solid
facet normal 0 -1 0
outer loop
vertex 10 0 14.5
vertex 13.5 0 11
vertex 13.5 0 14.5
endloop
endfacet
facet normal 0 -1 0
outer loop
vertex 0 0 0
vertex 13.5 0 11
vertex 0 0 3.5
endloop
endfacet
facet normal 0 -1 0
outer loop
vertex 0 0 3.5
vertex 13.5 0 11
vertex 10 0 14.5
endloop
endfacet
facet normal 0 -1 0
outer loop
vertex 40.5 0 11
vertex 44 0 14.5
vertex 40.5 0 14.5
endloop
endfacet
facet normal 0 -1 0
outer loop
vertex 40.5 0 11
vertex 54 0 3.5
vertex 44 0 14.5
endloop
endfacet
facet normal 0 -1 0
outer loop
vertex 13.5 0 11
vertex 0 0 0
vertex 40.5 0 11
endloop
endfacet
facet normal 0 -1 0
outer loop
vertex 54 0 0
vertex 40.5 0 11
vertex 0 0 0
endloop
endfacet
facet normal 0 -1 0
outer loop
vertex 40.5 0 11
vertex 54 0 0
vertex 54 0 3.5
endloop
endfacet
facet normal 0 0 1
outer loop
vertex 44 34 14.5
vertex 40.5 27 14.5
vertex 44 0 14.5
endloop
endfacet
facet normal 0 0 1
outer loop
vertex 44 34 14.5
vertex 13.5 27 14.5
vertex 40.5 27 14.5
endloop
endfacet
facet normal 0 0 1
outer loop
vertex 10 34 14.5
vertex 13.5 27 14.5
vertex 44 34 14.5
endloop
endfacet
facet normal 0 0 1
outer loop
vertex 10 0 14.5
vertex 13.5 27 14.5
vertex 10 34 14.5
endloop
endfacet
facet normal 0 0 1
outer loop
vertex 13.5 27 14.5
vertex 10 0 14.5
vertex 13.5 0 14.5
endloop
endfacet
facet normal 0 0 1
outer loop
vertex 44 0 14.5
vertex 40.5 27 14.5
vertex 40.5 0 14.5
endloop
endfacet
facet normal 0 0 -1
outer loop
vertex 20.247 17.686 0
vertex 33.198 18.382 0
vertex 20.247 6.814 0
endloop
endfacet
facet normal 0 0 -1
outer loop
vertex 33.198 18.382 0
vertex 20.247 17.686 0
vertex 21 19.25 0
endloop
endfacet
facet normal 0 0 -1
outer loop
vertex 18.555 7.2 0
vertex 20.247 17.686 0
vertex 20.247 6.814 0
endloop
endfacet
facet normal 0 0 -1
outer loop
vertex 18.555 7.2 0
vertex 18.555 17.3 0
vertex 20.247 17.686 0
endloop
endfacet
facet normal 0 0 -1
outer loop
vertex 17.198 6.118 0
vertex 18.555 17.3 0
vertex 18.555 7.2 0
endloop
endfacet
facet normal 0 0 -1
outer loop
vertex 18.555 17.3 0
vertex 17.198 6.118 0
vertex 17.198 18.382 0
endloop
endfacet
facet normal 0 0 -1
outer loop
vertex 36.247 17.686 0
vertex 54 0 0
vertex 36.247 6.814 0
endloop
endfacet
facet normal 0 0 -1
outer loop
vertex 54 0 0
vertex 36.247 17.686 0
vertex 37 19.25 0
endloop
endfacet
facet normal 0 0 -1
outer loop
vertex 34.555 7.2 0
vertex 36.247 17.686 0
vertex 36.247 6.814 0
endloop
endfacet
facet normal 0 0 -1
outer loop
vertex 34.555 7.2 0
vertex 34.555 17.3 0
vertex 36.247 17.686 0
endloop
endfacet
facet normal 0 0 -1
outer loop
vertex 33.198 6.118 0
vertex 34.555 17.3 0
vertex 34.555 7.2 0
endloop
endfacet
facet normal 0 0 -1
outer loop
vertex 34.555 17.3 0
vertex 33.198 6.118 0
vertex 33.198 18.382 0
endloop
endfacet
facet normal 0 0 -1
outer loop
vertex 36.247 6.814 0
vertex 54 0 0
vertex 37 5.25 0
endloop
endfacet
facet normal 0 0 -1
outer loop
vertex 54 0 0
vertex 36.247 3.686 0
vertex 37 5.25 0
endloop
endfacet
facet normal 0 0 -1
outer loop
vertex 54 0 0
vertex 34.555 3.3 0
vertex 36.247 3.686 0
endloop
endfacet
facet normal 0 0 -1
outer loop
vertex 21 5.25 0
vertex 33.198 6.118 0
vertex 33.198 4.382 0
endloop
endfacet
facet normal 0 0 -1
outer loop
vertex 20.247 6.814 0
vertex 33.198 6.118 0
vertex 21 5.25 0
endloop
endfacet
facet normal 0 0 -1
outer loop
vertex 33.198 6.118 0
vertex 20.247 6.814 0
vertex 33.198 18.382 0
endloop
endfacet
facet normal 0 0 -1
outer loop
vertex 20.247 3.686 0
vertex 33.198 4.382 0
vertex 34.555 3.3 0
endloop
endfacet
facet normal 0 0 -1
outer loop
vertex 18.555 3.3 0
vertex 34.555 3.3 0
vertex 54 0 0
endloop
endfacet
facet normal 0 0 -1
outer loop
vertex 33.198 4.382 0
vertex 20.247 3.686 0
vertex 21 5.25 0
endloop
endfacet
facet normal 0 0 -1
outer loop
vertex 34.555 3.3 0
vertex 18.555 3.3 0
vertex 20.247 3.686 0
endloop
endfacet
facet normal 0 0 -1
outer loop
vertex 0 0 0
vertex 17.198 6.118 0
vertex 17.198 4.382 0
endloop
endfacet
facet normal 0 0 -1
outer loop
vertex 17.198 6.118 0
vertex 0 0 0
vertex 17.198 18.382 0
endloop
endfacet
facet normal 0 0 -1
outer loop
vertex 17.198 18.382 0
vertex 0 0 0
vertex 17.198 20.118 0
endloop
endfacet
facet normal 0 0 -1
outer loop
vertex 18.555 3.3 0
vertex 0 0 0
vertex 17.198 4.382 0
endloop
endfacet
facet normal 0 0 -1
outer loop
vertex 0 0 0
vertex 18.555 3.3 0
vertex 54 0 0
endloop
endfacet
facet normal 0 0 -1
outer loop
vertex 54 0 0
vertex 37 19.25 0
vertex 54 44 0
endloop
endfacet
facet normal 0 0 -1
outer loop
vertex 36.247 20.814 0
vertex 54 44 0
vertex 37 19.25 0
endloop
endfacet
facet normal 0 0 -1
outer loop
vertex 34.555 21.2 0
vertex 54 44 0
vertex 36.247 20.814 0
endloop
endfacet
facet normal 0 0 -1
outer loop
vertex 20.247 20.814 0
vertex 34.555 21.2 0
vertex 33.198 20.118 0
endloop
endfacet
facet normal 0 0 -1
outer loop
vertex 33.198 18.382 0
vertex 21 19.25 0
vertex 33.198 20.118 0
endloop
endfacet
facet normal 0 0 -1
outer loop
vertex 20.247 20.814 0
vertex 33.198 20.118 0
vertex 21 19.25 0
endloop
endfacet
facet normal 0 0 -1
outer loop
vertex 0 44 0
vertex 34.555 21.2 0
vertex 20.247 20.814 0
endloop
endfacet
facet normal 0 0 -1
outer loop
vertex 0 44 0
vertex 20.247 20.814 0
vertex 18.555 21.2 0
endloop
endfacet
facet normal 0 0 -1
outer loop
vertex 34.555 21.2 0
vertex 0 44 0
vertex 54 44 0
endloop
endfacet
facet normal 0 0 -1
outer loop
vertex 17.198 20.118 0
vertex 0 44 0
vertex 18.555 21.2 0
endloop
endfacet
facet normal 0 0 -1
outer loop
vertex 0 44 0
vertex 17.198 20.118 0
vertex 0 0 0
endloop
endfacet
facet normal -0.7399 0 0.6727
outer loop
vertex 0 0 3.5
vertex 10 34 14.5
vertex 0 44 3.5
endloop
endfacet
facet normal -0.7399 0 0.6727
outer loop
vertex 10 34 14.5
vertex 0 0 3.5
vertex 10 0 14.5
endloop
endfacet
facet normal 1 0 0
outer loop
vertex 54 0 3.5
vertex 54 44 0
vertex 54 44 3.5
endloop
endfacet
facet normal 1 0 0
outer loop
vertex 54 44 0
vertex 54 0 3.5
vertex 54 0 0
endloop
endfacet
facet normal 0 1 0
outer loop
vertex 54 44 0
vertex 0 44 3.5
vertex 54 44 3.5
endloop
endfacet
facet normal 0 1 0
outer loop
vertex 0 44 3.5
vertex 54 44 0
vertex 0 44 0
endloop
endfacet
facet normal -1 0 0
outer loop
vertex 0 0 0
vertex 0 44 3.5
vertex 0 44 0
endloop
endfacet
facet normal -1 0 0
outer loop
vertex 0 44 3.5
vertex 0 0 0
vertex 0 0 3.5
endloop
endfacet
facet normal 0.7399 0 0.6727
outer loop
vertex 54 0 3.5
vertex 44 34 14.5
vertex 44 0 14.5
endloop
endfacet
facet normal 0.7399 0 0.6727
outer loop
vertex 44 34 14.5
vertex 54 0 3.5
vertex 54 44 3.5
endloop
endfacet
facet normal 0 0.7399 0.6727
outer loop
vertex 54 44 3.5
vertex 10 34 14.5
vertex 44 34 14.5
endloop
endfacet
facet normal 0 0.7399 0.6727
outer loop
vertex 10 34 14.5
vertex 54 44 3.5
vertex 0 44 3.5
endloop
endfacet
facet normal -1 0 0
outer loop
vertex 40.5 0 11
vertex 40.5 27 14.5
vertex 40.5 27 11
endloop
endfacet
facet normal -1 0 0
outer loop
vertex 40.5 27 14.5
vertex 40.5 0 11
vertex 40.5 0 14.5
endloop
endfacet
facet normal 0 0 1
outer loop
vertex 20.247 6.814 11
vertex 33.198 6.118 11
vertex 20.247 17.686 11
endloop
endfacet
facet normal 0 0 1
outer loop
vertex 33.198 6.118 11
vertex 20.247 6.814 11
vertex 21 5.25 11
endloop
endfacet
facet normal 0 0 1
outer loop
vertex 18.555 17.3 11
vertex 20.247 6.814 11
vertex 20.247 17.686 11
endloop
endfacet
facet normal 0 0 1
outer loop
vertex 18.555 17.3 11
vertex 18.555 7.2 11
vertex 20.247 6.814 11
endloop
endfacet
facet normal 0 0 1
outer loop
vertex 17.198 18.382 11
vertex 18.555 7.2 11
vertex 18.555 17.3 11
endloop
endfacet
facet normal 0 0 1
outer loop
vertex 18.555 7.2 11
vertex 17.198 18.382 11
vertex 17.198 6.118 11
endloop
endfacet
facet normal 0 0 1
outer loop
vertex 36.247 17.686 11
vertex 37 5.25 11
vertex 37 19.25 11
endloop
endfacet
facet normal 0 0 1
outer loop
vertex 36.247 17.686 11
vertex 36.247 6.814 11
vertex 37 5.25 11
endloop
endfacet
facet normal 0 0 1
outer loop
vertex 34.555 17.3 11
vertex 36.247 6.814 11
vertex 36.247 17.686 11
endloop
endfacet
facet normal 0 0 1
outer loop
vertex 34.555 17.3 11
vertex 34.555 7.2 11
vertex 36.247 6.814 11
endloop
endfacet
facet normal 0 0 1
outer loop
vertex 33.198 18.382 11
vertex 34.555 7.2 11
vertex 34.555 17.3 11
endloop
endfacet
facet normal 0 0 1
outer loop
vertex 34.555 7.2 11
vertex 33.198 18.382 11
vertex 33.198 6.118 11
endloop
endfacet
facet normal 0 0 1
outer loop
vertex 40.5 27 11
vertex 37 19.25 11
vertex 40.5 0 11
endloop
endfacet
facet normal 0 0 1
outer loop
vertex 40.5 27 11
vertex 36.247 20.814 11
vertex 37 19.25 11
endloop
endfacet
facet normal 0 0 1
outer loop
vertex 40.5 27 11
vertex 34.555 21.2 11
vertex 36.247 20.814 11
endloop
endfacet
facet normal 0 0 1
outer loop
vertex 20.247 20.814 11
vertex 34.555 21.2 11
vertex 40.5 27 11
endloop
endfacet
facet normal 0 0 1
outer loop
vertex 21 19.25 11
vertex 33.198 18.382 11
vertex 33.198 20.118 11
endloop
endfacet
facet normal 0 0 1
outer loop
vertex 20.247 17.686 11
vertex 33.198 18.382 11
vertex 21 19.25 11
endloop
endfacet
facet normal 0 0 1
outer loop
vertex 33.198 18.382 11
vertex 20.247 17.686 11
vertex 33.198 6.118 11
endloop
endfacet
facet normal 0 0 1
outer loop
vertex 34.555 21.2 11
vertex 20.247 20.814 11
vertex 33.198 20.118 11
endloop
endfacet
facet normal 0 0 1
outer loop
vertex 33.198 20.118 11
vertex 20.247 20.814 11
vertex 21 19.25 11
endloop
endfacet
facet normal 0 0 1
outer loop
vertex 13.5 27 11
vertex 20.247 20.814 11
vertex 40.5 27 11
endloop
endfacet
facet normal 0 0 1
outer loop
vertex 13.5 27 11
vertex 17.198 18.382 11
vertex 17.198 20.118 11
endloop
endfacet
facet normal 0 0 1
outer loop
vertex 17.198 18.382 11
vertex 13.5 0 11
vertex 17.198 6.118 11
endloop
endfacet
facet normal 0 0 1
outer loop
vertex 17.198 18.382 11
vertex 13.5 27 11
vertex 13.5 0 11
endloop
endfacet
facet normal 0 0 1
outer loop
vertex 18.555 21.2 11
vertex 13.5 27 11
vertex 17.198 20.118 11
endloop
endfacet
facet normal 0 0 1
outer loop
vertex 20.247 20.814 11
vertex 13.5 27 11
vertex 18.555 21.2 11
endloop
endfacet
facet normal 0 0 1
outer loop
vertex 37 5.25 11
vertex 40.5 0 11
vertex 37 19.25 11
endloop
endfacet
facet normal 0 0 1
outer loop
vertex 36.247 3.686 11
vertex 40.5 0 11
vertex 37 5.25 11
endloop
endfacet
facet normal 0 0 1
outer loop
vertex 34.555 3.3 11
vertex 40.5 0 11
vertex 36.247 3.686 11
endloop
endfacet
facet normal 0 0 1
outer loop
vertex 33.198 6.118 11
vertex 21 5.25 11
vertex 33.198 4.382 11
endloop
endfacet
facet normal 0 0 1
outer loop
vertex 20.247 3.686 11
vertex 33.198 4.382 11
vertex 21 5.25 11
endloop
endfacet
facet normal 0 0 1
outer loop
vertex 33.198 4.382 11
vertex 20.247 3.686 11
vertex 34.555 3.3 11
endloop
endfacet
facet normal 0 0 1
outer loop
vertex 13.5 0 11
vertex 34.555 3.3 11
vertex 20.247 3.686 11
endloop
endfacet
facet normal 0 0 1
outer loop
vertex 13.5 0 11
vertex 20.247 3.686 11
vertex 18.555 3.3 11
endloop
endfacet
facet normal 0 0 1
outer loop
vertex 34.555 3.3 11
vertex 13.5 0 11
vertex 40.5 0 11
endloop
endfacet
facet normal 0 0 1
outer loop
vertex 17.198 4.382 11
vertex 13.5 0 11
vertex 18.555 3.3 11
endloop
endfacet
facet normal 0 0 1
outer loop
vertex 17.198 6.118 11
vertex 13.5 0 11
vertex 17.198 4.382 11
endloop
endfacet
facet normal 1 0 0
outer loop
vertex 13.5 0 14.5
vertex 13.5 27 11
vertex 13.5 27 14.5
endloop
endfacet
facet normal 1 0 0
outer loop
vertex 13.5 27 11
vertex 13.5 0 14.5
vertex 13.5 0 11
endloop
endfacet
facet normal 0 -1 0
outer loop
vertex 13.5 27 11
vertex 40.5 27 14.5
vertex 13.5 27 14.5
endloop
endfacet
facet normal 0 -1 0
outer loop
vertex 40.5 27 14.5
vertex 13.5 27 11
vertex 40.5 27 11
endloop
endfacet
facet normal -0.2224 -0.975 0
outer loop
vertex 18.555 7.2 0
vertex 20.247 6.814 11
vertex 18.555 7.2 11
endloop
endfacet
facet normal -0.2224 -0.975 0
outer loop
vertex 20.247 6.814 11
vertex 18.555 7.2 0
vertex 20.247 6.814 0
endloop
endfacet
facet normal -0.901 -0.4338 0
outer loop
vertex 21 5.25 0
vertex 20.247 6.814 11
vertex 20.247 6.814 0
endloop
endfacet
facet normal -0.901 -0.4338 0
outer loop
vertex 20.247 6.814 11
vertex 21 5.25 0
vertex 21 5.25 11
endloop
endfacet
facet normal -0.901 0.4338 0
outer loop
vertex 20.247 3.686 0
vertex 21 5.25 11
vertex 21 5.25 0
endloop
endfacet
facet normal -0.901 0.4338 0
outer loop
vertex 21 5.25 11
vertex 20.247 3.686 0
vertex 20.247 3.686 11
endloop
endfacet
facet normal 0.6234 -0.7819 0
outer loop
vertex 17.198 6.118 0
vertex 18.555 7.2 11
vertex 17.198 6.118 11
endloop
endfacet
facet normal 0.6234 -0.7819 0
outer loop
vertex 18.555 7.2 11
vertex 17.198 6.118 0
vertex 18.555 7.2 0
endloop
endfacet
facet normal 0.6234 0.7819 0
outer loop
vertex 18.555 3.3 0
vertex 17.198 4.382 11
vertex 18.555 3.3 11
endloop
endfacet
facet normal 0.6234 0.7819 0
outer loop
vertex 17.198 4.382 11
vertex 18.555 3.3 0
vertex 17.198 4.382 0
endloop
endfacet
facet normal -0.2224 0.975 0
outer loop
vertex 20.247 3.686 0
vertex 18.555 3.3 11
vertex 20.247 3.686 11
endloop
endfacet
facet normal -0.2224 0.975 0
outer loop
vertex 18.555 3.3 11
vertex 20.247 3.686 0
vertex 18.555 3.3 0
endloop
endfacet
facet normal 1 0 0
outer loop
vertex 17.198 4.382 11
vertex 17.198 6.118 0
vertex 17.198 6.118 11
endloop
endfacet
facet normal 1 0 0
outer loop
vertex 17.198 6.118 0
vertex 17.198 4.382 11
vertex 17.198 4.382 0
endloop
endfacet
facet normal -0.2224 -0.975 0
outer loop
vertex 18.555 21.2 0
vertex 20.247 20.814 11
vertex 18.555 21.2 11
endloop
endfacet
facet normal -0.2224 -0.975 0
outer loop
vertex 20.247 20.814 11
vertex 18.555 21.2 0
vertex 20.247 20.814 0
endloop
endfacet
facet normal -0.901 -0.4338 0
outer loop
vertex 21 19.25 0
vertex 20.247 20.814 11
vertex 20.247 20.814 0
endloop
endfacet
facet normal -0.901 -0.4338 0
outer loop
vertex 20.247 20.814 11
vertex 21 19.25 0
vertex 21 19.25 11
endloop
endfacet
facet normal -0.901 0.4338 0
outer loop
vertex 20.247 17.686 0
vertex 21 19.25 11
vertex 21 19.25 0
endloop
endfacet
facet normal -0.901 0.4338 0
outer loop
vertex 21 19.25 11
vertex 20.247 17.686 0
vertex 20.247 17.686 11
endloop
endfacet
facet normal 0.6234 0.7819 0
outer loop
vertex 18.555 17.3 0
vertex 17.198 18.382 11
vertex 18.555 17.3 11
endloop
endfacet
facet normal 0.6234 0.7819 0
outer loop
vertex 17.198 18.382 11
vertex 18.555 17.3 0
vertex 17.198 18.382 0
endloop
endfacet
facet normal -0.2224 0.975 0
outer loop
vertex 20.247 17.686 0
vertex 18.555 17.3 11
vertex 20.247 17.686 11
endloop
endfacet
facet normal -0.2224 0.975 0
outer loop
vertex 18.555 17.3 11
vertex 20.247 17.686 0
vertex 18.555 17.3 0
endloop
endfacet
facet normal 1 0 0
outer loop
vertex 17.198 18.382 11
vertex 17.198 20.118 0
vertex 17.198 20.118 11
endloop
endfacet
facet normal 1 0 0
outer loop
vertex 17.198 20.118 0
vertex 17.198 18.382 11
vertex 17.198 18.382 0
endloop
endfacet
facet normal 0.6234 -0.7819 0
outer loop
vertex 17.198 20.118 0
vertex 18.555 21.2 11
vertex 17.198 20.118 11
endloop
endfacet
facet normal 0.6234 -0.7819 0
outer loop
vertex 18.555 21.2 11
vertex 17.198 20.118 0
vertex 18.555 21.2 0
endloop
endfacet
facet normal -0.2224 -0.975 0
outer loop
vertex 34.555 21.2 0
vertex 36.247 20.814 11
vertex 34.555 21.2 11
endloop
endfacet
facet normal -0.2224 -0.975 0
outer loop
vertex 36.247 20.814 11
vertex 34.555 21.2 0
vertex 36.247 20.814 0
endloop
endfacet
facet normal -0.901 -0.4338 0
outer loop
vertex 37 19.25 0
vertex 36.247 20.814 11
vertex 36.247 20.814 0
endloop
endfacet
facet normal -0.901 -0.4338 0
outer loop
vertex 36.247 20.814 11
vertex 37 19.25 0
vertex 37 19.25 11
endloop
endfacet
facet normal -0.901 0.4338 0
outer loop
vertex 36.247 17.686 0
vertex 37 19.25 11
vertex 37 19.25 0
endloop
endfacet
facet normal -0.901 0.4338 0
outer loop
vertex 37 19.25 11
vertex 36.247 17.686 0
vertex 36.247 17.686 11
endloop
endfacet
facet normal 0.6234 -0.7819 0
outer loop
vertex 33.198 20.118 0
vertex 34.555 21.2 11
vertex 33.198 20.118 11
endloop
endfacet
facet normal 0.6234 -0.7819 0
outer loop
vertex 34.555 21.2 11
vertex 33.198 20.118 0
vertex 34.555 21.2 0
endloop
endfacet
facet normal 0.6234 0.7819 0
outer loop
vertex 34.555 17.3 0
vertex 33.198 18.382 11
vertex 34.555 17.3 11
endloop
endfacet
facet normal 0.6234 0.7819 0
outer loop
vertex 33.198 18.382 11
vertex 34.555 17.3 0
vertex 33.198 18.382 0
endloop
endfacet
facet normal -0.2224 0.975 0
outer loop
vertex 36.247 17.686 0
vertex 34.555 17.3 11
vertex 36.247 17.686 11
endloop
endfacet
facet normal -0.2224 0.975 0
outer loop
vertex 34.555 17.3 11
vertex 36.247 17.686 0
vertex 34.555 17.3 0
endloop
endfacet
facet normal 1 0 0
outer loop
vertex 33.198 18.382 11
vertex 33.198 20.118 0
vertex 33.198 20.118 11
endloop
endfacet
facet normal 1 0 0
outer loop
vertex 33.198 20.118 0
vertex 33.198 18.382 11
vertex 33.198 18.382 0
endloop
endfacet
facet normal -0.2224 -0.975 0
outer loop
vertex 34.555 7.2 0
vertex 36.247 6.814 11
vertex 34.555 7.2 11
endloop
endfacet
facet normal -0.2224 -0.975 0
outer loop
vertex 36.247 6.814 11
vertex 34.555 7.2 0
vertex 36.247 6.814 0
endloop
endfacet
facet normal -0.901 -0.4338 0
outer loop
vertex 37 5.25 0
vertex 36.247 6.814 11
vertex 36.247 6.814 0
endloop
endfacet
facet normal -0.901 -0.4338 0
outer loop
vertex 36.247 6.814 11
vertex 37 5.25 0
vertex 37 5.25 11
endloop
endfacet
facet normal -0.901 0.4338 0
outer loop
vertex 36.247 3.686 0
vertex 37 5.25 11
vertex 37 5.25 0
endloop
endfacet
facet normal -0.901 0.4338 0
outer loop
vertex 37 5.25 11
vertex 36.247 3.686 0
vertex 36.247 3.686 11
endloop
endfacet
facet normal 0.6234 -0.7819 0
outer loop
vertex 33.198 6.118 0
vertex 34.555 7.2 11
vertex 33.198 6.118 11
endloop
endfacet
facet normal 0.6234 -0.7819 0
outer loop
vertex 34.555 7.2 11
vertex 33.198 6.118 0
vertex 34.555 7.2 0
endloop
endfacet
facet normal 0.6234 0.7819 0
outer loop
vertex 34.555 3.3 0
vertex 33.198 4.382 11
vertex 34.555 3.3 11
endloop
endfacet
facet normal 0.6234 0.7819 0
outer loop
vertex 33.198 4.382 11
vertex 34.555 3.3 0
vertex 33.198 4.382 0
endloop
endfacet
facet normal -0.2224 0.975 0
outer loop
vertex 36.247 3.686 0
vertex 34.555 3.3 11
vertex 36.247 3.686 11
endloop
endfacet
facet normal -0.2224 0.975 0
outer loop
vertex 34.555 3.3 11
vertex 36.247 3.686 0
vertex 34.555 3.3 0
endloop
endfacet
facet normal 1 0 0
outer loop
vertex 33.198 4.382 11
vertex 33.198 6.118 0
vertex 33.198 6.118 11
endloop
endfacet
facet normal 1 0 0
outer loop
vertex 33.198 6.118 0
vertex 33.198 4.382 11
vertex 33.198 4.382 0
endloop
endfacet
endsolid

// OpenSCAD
height = 11;
wall=3.5;
bkt_w = 27;
bkt_l = 27;
bkt_h = 3.5;
hole_d = 4;

skirt = 10;

hole_center = (2*wall + bkt_w) / 2;
h_x1 = skirt + hole_center - 8;
h_x2 = skirt + hole_center + 8;
h_y1 = 5.25;
h_y2 = h_y1 + 14;

top_w = bkt_w + (2 * wall);
top_l = bkt_l + (2 * wall);
top_offset = skirt;
bottom_w = top_w + (2 * skirt);
bottom_l = top_l + skirt;

difference() {
    hull() {
        translate([skirt, 0, height+wall-0.1]) cube([top_w, top_l, 0.1], false);
        translate([0, 0, 0]) cube([bottom_w, bottom_l, wall], false);
    }
   translate([wall+skirt, 0, height])  cube([bkt_w,bkt_l,bkt_h], false);
   translate([h_x1, h_y1, 0]) cylinder(h=height,d= hole_d, center=false);
   translate([h_x1, h_y2, 0]) cylinder(h=height,d= hole_d, center=false);
   translate([h_x2, h_y2, 0]) cylinder(h=height,d= hole_d, center=false);
   translate([h_x2, h_y1, 0]) cylinder(h=height,d= hole_d, center=false);
}
